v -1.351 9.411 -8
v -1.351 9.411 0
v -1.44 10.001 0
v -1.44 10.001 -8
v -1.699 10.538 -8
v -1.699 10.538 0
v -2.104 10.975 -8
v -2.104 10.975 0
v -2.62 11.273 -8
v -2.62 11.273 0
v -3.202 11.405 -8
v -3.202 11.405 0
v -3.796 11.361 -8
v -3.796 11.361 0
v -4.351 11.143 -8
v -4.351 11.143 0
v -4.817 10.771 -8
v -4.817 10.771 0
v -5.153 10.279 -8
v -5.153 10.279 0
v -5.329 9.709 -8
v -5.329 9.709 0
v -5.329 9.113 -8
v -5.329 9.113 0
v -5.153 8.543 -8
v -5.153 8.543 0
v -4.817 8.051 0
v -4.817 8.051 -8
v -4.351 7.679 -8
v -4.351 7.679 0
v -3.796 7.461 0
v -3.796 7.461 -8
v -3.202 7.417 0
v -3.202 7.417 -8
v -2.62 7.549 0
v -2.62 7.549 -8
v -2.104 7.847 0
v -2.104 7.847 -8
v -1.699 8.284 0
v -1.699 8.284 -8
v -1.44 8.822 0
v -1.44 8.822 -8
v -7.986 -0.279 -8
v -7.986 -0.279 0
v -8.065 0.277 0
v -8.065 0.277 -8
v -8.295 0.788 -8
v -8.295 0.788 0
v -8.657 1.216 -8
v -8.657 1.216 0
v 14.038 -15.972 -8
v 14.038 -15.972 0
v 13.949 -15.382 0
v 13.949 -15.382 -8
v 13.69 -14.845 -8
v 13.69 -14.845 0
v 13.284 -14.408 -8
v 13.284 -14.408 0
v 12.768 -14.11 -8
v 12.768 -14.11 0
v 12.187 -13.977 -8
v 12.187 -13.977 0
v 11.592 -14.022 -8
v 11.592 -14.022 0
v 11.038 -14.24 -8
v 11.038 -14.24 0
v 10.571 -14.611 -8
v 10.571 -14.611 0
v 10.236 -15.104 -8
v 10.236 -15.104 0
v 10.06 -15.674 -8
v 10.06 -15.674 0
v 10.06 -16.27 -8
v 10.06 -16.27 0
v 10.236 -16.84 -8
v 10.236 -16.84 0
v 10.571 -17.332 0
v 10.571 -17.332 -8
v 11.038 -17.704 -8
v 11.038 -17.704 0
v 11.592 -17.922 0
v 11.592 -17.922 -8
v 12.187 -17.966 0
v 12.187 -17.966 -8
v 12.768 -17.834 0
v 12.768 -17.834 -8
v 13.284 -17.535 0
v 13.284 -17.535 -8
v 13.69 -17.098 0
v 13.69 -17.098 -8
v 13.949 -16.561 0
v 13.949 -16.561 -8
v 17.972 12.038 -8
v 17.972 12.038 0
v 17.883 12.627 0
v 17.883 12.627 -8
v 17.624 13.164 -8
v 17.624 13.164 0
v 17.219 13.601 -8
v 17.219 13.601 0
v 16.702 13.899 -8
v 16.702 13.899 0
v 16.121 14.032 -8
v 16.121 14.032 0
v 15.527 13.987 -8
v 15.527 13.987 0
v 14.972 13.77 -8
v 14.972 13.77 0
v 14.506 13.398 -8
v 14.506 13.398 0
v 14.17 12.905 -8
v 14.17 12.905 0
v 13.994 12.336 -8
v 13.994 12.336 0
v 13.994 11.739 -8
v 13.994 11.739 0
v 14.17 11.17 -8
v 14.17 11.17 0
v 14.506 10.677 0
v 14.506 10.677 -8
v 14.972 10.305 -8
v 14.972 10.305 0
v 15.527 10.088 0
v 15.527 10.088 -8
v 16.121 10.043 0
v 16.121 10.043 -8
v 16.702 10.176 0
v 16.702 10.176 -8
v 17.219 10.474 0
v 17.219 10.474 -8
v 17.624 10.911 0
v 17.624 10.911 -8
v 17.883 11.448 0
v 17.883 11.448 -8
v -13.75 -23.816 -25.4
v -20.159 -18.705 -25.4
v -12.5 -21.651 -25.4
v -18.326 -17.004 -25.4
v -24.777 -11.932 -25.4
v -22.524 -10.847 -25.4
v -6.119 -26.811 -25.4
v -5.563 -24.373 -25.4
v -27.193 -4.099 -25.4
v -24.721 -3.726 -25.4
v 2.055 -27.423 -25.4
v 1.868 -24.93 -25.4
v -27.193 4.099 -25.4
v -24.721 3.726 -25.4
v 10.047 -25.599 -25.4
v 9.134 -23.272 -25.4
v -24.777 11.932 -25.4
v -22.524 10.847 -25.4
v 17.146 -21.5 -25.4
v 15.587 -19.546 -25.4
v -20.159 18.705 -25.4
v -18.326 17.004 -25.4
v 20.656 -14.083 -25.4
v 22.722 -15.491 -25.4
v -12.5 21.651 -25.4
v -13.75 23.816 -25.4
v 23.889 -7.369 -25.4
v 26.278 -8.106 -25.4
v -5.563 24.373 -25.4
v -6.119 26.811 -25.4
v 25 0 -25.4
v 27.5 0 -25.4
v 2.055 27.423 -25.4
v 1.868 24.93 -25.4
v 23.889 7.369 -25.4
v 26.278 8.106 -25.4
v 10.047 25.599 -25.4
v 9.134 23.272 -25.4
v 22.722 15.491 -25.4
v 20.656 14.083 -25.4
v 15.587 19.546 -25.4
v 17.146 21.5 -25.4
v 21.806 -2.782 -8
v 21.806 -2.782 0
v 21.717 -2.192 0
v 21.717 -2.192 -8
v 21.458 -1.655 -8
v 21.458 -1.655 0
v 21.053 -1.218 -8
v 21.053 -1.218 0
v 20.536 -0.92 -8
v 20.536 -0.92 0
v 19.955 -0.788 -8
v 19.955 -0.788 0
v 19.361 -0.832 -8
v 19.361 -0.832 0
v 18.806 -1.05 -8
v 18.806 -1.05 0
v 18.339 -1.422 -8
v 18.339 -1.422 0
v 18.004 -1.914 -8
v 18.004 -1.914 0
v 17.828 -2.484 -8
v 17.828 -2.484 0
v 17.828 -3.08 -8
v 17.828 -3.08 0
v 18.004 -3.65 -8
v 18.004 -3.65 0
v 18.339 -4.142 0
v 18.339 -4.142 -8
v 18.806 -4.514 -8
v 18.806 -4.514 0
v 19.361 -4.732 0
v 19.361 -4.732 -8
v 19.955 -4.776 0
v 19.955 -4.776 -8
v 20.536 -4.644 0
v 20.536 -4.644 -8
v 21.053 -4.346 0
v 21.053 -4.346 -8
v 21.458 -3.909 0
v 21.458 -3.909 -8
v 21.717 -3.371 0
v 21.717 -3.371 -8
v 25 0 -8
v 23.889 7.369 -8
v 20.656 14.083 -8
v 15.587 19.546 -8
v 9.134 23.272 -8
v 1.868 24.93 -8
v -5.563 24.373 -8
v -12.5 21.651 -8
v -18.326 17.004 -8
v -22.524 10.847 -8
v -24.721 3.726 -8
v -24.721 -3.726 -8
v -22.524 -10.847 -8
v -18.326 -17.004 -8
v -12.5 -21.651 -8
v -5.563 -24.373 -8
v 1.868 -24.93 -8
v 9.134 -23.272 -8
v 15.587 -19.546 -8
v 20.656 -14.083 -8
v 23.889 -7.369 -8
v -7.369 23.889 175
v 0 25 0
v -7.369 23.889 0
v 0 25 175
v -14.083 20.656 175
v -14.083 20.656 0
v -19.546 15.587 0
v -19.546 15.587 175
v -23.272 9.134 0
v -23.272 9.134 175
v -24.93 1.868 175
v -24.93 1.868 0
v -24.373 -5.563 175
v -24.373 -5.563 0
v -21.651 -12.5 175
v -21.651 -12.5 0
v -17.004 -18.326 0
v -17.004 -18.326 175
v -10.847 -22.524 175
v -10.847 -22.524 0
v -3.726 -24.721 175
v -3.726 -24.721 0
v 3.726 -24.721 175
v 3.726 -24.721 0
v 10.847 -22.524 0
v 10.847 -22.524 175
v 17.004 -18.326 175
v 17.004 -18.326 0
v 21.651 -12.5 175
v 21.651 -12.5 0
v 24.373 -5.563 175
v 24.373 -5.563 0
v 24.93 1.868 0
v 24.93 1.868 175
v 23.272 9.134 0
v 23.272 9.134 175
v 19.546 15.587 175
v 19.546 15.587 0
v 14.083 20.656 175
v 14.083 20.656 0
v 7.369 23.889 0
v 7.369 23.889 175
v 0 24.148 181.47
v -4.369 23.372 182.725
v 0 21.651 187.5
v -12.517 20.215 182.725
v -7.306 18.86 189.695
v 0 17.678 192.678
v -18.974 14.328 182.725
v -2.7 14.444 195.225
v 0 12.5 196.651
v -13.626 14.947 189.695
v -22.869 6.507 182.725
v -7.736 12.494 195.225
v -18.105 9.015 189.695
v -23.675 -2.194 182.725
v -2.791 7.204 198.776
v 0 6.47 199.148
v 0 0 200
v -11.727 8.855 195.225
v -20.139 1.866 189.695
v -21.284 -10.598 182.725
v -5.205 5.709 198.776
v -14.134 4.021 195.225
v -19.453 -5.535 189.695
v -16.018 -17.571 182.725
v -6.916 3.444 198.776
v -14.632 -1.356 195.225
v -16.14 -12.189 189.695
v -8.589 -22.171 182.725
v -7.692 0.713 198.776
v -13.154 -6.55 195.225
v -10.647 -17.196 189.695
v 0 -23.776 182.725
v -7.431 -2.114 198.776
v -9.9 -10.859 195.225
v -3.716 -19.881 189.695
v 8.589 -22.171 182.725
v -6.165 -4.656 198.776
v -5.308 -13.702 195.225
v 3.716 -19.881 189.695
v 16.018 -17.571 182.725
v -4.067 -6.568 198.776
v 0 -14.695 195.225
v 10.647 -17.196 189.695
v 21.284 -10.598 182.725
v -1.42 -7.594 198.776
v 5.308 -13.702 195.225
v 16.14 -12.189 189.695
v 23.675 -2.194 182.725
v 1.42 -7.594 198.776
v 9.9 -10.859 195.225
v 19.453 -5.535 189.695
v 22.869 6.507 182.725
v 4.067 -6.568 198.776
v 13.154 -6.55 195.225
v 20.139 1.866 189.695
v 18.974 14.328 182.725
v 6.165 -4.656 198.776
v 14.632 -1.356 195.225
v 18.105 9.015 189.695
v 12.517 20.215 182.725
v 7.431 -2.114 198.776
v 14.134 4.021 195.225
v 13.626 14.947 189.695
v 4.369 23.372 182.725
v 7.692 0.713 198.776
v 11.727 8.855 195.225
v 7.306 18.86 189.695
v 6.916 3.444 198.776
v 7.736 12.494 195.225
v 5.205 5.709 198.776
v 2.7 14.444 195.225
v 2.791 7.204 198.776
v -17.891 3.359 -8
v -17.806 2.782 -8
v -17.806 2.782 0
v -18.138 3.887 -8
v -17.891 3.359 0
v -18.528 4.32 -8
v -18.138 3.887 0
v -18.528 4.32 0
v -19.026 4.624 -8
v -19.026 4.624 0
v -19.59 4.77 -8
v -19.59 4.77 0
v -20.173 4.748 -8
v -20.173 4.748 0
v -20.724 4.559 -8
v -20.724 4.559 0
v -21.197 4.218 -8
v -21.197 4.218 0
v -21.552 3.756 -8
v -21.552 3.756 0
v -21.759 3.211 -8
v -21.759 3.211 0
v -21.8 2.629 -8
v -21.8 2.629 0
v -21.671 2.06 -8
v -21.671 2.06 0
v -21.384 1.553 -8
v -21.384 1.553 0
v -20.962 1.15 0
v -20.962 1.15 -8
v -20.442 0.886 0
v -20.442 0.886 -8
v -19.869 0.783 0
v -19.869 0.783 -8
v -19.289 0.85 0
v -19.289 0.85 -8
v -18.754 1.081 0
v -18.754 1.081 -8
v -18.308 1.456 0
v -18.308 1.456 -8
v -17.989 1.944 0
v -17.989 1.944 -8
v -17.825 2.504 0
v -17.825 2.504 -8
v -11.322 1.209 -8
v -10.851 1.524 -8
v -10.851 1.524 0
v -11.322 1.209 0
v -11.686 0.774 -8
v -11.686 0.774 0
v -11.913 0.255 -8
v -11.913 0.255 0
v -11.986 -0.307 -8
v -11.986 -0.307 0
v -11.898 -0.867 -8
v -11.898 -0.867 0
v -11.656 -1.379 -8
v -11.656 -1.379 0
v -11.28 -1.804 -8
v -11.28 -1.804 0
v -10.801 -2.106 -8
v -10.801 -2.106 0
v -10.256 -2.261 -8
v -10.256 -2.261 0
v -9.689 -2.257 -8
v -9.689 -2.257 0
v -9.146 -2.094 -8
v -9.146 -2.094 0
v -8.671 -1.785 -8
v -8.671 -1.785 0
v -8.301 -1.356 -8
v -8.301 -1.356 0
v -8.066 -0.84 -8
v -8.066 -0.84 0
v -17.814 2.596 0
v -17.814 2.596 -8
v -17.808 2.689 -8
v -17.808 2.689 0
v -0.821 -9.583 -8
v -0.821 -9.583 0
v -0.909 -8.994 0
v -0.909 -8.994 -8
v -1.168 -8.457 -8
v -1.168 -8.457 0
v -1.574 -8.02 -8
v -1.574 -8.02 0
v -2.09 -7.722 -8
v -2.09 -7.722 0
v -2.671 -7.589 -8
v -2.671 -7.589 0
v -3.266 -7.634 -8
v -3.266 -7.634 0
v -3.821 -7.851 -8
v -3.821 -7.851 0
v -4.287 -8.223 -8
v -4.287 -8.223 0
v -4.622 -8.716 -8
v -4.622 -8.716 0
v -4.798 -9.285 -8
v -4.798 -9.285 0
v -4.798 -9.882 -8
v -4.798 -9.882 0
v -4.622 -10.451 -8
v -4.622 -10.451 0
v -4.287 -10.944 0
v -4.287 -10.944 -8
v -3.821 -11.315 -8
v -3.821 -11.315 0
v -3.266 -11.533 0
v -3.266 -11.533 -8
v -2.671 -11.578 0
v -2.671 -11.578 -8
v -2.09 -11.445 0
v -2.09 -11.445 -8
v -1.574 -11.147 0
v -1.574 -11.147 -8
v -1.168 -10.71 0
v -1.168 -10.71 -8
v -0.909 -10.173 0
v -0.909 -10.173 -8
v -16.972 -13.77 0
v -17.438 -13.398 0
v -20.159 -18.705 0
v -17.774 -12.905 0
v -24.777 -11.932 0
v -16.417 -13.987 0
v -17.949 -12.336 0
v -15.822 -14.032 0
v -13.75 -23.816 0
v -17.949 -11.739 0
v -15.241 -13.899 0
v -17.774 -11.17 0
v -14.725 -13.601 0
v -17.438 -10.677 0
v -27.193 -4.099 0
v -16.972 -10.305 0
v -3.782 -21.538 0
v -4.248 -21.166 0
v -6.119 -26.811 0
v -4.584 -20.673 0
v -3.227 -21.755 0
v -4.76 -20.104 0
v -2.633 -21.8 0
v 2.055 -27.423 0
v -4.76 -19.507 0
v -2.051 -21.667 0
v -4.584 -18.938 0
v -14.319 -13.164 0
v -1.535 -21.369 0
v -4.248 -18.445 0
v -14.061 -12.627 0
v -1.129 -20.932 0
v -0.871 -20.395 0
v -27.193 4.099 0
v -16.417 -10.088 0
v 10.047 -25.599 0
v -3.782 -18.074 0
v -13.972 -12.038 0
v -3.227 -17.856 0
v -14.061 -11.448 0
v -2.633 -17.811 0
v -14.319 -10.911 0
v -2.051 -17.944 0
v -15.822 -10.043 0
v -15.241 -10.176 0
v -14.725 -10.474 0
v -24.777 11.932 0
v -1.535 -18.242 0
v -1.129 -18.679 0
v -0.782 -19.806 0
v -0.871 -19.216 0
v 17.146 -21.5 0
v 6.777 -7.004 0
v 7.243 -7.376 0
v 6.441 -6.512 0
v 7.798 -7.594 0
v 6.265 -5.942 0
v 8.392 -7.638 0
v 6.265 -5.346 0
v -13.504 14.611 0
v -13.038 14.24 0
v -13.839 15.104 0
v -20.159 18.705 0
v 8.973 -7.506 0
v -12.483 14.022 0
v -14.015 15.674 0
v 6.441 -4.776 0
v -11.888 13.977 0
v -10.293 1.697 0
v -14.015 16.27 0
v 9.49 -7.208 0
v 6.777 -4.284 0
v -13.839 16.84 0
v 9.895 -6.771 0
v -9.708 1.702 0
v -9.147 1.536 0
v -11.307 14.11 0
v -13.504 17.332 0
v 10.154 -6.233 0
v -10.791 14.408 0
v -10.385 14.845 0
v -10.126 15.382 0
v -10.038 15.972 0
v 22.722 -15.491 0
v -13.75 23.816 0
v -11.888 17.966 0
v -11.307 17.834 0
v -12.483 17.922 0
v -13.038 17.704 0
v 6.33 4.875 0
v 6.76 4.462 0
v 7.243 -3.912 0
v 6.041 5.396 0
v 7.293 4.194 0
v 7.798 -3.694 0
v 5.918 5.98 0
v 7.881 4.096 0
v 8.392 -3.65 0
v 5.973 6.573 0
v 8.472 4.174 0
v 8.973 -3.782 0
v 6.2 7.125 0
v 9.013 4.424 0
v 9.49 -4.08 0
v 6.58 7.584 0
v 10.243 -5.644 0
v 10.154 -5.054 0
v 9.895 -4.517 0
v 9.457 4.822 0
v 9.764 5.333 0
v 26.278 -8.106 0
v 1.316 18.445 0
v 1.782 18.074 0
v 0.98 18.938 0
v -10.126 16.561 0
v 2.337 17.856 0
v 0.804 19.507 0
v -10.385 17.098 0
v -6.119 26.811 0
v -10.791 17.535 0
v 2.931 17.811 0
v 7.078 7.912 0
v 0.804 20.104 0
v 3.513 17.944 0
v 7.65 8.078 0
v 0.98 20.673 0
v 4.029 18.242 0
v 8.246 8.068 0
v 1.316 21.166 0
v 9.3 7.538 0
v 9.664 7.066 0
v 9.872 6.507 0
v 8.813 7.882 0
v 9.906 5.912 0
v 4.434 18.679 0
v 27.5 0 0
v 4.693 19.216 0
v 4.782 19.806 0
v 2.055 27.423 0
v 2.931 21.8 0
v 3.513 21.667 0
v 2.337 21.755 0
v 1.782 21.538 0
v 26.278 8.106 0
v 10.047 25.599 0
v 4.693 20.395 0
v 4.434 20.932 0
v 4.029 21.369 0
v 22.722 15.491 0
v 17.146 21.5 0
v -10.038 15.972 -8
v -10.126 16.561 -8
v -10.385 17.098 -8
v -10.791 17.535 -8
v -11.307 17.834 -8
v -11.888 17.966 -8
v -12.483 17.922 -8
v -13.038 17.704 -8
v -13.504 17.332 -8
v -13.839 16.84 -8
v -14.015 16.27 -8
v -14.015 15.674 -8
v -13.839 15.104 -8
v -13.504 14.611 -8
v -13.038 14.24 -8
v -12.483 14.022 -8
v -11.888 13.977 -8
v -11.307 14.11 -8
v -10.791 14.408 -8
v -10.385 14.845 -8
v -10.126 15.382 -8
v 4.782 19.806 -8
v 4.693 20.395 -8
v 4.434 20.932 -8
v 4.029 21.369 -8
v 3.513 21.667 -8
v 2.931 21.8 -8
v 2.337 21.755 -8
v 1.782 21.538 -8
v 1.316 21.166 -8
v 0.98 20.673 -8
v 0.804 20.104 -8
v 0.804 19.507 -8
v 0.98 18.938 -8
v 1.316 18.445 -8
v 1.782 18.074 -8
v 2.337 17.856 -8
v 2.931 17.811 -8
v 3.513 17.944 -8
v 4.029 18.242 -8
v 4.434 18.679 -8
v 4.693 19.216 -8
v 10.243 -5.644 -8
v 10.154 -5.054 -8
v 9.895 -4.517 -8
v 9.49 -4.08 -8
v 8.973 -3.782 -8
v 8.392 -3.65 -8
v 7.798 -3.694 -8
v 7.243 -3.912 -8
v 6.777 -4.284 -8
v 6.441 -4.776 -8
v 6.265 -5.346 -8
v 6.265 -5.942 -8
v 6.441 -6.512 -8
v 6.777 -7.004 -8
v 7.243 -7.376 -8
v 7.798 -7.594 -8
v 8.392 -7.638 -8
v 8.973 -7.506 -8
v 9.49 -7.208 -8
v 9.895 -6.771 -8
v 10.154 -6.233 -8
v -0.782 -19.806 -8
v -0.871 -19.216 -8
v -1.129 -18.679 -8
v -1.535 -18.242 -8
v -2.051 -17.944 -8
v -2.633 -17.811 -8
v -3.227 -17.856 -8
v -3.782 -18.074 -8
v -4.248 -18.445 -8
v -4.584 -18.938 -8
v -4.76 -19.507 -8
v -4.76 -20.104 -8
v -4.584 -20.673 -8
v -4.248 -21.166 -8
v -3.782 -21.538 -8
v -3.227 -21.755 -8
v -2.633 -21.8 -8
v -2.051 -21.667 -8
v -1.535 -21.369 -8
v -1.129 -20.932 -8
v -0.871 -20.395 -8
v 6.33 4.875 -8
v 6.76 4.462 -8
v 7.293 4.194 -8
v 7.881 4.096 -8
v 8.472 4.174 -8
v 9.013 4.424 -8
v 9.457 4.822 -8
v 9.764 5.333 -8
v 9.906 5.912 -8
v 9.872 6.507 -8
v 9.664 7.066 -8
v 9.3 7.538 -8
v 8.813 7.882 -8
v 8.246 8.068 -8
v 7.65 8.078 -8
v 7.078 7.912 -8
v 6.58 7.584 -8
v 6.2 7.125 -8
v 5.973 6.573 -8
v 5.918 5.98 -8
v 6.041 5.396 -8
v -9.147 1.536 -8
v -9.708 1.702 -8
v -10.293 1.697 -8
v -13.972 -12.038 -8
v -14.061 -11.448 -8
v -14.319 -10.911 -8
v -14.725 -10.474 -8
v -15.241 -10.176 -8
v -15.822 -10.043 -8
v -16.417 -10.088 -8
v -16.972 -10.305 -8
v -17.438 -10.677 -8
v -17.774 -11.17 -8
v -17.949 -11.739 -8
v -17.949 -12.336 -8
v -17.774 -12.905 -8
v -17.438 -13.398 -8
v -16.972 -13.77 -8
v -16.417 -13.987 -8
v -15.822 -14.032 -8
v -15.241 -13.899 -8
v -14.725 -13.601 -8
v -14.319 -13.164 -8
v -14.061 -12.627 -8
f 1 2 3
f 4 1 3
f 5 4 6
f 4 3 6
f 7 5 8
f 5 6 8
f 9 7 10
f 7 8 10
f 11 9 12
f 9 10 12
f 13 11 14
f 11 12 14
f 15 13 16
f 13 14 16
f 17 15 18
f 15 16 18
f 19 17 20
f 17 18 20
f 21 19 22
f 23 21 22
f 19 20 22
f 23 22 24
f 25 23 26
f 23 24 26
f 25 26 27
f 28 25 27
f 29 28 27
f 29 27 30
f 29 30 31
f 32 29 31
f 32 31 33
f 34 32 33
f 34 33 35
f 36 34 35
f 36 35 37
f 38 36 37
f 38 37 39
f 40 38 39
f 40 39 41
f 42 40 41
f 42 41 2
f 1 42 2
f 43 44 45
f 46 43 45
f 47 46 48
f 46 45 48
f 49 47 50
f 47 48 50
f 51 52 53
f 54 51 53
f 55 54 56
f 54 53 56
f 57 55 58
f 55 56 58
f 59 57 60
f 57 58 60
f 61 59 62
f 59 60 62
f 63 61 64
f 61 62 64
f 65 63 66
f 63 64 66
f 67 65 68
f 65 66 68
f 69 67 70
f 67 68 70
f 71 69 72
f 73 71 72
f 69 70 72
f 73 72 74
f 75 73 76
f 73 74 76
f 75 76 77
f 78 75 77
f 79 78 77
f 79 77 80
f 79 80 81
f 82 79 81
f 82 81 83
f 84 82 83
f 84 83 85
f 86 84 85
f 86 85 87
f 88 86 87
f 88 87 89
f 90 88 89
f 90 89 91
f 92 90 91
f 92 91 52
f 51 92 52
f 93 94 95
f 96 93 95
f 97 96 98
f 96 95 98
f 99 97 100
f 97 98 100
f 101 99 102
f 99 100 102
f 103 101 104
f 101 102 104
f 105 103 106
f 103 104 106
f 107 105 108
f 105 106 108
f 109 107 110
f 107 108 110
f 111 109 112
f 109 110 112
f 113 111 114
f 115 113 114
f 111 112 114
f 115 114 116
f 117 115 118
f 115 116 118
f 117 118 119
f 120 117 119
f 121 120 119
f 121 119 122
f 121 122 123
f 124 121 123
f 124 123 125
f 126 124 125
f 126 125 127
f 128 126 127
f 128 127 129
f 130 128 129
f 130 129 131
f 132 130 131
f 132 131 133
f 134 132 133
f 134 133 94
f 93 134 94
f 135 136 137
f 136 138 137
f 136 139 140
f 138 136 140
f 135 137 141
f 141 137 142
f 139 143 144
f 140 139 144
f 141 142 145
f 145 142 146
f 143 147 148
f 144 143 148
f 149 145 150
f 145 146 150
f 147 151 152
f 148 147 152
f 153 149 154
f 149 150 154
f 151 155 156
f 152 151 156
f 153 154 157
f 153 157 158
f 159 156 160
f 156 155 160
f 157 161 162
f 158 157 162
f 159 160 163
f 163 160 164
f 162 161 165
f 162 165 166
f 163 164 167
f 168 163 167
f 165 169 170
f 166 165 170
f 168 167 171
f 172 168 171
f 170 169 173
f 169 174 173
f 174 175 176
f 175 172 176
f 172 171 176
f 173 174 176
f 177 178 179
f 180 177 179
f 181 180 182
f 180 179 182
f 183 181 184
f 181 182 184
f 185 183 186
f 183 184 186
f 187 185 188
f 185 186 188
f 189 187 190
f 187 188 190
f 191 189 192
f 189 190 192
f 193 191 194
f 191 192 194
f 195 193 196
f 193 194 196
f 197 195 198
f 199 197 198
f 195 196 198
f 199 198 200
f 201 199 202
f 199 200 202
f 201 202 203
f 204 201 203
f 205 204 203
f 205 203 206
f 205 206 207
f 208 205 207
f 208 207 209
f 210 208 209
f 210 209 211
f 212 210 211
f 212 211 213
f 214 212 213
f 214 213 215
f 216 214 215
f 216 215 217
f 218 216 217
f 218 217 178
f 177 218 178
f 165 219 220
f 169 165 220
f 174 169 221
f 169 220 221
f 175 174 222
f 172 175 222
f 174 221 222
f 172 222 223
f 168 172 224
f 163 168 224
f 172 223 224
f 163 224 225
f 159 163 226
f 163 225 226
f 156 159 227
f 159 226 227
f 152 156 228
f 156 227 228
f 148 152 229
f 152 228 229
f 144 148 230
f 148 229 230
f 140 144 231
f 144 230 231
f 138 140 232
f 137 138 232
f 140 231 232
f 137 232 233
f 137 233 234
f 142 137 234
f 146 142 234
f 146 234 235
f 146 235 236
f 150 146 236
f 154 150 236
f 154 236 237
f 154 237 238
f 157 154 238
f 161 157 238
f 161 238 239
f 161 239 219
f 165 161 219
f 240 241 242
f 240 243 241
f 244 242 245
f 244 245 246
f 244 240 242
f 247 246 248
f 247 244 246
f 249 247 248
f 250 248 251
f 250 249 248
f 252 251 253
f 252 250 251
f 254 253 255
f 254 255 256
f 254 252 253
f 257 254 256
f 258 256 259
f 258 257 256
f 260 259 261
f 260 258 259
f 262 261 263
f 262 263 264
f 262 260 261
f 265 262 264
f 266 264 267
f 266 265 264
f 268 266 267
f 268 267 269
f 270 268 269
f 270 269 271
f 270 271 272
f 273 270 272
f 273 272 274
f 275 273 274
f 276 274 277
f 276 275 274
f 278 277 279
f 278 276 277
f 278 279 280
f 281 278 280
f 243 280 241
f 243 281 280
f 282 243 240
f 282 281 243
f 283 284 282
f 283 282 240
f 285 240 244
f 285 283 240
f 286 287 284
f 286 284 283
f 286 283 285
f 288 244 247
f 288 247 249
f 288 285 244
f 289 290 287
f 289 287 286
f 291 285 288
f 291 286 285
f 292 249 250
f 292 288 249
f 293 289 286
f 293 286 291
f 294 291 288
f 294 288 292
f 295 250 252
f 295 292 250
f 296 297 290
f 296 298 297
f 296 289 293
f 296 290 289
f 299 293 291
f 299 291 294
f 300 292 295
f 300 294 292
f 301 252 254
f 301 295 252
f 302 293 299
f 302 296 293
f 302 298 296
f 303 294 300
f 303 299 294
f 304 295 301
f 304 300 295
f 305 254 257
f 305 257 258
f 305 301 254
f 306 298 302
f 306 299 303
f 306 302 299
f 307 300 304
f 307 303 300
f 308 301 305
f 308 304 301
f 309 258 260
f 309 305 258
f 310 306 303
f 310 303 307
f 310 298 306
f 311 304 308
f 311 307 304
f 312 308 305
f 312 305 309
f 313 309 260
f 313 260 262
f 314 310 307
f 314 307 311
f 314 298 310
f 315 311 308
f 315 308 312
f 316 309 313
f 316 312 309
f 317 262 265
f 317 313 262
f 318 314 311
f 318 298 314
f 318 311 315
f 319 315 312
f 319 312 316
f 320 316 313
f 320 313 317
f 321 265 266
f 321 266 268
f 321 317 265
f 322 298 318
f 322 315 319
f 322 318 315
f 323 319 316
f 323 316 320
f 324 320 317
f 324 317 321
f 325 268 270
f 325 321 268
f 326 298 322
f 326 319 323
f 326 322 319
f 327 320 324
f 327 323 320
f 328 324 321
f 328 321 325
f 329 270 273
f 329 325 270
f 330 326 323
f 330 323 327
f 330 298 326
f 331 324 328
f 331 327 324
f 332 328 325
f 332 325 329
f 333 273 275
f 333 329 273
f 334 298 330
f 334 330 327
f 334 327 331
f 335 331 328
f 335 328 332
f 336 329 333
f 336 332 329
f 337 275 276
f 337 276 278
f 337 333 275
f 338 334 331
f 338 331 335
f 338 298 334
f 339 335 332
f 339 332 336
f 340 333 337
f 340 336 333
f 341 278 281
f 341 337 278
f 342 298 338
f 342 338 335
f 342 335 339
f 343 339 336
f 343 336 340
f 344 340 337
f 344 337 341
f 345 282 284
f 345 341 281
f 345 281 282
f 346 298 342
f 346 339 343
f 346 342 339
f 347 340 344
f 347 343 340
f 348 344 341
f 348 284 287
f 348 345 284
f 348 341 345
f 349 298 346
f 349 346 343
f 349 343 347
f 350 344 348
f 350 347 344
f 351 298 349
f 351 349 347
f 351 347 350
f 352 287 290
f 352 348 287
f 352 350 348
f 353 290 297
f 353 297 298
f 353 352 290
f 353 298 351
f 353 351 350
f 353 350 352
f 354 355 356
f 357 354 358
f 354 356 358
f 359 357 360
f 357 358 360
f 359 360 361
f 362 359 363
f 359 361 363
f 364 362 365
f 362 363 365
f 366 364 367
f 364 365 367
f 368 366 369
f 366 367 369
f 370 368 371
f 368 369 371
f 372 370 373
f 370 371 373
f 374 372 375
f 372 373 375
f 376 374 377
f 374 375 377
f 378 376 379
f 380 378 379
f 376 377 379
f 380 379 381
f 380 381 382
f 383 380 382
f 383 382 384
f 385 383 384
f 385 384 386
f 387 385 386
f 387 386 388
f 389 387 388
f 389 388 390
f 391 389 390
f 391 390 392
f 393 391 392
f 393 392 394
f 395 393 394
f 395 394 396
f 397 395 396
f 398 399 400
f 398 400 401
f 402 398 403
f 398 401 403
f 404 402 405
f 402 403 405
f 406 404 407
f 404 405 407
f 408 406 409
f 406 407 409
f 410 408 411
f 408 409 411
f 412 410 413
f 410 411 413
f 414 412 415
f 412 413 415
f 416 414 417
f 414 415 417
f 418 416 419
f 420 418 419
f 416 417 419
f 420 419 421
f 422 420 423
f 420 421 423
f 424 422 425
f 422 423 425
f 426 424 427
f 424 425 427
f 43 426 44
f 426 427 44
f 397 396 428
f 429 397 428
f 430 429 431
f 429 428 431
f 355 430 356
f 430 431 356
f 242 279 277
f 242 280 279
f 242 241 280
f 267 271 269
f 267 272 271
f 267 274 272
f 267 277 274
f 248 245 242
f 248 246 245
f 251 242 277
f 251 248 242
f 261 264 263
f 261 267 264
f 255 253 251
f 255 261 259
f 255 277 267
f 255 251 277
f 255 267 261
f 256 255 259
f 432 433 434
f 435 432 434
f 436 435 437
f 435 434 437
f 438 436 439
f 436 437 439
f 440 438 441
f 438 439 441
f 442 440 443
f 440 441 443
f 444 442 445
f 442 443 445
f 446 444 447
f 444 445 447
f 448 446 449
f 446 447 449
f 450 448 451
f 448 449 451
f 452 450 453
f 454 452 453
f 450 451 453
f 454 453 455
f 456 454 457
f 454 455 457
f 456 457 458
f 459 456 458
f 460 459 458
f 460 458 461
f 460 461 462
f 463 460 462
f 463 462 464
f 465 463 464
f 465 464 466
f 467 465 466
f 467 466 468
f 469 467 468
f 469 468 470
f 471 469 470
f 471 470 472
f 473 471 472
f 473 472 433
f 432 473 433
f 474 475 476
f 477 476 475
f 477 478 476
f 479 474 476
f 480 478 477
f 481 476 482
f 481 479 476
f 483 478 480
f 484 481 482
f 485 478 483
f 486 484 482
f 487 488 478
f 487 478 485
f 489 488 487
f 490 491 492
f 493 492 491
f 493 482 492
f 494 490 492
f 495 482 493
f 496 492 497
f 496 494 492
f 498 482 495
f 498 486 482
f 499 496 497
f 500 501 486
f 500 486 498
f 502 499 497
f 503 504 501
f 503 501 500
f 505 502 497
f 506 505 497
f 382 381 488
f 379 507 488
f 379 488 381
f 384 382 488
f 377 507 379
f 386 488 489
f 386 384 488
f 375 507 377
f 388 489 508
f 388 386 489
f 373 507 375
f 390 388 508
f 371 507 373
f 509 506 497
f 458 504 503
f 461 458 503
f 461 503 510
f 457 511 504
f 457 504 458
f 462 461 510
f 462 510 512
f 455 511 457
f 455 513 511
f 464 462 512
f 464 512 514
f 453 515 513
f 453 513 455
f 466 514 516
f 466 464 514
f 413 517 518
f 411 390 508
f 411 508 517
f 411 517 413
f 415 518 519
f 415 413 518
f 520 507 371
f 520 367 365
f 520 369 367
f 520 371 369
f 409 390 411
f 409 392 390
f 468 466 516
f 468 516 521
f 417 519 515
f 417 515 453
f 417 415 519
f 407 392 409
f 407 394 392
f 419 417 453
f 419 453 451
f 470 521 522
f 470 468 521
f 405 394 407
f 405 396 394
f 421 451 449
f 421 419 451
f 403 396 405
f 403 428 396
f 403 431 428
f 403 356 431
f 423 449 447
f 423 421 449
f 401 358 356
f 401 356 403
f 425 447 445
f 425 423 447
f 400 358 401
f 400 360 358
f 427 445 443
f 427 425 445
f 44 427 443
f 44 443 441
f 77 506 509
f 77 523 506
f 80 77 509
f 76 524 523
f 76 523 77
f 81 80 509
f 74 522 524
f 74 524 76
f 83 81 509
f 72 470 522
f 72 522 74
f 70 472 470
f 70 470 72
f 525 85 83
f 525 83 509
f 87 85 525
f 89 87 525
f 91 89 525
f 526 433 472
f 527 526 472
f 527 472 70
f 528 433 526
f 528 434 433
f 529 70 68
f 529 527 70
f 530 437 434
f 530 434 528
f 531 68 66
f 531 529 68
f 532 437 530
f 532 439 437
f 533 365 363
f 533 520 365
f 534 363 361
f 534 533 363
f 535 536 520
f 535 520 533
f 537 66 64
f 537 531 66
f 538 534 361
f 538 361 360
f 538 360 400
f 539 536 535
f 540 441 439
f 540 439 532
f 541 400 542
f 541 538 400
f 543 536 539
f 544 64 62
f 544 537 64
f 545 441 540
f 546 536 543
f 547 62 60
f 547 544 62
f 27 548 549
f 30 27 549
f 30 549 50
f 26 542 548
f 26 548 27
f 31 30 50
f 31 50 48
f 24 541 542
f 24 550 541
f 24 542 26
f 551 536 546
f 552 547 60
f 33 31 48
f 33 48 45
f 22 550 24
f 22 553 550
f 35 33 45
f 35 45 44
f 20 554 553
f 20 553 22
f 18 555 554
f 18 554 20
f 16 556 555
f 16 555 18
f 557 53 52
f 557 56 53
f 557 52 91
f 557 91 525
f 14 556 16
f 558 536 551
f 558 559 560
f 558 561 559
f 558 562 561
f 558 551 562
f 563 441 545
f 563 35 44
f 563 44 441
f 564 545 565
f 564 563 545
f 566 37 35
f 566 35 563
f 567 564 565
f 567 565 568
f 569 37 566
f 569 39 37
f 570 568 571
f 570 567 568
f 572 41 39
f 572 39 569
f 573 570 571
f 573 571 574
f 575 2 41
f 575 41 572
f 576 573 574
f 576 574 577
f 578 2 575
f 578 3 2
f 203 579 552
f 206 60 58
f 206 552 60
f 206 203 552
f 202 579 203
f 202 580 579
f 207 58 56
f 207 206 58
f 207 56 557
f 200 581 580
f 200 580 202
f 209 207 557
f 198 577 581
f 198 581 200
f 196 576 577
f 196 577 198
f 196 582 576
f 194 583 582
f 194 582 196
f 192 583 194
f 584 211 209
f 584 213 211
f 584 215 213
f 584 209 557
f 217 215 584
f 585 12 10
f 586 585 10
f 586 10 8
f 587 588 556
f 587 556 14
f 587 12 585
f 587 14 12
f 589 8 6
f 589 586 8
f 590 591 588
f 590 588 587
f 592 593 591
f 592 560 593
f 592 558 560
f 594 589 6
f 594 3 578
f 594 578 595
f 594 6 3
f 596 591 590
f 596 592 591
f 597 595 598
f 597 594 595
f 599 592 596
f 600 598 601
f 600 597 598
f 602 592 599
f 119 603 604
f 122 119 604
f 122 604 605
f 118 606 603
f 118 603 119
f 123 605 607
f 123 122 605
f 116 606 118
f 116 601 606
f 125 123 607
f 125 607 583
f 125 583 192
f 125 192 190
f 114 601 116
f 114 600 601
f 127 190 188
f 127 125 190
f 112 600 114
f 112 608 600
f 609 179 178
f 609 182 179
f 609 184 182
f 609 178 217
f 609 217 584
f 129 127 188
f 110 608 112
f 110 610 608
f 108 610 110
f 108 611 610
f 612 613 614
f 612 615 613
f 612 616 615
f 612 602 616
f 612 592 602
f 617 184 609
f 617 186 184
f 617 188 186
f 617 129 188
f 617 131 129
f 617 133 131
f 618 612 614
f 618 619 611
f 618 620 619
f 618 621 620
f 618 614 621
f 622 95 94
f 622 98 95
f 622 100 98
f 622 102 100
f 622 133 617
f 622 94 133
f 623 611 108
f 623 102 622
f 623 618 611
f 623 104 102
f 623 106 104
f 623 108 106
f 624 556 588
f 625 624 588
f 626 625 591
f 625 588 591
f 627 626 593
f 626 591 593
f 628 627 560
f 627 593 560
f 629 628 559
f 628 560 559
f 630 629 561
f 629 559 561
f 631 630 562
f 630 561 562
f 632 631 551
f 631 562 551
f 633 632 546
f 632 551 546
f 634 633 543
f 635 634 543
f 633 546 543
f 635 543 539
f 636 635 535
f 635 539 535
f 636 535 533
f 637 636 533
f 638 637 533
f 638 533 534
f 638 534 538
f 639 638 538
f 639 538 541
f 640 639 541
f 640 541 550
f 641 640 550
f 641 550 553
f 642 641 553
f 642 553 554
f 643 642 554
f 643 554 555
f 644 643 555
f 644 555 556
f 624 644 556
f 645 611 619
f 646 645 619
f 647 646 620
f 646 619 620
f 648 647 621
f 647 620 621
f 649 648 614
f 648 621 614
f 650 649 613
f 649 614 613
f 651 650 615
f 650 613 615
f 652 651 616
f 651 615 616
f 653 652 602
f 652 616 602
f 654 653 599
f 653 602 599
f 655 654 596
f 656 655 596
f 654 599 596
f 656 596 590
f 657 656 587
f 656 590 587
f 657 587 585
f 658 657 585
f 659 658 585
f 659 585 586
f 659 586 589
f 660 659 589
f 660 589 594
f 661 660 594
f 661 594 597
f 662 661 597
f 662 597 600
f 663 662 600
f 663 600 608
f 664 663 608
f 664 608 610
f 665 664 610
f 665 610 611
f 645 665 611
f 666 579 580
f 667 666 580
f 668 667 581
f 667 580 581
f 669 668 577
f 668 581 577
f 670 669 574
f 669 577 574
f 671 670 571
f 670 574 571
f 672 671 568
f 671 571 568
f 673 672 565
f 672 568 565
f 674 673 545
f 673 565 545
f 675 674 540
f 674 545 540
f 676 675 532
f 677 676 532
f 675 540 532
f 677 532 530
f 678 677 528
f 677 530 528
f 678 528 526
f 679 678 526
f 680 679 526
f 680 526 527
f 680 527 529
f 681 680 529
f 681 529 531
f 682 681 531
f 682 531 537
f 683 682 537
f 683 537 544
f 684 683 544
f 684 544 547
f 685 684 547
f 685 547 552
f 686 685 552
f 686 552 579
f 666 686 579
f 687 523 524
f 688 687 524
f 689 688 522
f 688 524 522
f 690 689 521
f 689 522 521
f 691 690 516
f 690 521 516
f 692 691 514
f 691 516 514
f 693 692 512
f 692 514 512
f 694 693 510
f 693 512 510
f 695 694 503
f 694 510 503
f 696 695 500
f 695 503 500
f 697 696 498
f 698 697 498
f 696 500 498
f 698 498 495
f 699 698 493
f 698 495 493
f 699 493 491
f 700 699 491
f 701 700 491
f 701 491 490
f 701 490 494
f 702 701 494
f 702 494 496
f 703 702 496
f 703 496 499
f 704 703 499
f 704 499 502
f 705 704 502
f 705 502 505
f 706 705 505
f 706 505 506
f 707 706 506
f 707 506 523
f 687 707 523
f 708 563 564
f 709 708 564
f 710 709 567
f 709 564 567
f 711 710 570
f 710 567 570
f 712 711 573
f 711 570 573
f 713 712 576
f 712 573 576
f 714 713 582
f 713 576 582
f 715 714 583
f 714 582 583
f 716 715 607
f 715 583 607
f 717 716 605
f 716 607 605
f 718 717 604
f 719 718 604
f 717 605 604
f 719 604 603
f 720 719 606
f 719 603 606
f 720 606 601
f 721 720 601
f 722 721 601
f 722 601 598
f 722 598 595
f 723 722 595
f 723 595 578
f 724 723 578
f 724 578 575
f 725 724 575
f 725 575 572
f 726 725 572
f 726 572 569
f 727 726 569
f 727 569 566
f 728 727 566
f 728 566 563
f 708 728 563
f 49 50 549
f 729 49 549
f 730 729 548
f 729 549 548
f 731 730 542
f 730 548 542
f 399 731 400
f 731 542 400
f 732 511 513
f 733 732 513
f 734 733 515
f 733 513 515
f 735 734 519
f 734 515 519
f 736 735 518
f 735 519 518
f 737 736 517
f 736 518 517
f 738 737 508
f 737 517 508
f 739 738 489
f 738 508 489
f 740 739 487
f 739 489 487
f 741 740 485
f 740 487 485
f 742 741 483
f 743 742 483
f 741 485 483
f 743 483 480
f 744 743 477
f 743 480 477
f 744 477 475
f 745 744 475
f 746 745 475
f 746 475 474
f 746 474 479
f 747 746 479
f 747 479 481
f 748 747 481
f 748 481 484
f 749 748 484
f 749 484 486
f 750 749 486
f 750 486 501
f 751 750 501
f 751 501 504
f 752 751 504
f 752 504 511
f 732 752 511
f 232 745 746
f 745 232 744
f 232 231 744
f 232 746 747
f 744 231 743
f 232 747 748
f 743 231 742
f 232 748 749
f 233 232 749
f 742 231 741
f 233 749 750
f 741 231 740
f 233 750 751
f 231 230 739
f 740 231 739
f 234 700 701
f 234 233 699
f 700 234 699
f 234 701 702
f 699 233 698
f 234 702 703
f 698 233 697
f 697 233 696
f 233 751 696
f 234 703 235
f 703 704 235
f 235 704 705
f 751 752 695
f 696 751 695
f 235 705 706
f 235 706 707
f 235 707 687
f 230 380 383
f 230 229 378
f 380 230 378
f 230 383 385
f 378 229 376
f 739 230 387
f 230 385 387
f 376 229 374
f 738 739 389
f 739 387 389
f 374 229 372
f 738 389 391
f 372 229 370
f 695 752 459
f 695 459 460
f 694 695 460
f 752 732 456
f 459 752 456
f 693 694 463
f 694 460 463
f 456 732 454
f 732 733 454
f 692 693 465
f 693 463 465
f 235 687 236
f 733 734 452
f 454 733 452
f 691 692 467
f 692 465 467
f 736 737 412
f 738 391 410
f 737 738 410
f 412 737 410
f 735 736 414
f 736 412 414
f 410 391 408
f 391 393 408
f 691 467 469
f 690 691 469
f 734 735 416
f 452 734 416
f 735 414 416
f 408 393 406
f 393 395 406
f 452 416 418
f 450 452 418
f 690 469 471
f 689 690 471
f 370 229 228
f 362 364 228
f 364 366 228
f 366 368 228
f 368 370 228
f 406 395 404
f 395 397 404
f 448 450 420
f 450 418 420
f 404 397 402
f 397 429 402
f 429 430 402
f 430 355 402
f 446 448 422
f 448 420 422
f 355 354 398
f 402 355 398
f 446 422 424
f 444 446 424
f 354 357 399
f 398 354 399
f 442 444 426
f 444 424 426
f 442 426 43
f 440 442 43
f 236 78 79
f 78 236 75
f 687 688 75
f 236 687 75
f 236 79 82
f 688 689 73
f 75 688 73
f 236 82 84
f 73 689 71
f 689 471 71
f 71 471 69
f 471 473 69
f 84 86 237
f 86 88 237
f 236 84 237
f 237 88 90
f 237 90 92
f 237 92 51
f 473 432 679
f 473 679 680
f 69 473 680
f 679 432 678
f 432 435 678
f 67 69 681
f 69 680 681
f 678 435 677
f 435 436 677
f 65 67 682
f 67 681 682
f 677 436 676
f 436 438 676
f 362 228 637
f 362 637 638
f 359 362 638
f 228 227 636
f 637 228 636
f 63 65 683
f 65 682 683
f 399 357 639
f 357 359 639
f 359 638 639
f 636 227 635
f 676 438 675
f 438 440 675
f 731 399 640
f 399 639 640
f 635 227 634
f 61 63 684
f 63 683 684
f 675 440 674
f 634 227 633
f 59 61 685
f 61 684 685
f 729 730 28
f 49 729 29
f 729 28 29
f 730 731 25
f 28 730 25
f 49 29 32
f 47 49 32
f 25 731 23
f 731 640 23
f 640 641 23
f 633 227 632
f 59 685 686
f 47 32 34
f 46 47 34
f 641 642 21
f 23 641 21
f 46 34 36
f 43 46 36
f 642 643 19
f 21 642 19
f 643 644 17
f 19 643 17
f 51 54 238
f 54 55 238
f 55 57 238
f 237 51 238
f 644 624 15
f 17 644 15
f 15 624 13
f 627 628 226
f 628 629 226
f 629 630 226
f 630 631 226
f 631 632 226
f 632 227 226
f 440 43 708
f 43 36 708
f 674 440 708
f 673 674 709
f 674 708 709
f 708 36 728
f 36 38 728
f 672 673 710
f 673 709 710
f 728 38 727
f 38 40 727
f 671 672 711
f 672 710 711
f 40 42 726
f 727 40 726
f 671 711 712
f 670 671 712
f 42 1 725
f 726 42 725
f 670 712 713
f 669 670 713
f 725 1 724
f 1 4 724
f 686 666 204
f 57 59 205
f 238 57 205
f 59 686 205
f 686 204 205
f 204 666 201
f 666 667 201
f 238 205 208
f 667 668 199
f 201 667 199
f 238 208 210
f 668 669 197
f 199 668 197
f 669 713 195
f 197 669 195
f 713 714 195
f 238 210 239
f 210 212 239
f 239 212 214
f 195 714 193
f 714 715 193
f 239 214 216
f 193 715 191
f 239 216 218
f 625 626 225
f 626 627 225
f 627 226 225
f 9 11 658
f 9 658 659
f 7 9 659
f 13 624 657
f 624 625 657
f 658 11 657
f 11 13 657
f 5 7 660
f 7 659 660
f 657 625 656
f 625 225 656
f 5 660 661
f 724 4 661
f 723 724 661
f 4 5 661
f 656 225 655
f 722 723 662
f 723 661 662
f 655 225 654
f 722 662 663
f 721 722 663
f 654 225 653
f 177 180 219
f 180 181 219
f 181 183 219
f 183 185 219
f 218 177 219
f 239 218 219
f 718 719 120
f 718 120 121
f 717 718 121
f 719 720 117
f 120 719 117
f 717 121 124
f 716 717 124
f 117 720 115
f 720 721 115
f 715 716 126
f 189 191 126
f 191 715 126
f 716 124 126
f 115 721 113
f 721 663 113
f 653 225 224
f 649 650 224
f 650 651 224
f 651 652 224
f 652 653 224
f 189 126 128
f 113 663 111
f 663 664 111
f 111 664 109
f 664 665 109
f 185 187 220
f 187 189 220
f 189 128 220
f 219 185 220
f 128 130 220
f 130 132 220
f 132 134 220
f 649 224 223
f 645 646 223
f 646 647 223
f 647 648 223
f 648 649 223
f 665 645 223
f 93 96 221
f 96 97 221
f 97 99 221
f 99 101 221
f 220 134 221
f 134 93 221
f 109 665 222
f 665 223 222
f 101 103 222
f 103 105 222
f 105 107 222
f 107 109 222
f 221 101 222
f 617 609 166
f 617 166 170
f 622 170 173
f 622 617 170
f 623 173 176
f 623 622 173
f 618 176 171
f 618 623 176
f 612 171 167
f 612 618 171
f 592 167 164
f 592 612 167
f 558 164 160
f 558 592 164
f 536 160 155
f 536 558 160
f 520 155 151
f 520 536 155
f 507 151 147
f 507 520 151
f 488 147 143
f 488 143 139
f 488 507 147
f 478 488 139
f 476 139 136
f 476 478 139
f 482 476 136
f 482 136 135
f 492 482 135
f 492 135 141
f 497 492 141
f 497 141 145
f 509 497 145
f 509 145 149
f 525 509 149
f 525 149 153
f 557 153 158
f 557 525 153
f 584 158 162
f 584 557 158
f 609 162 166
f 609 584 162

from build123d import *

# Parameters (mm, degrees)
F2_R     = 27.5
F2_R_2   = 25
F3_DEPTH = 25.4
F4_DEPTH = 8
F5_R     = 2
F6_DEPTH = 25


with BuildPart() as f1:
    # F0 (on Right) → F1 (revolve)
    with BuildSketch(Plane.YZ):
        with BuildLine():
            Line((0, 200), (0, 0))
            Line((0, 0), (25, 0))
            Line((25, 0), (25, 175))
            ThreePointArc((25, 175), (17.6776695297, 192.6776695297), (0, 200))
        make_face()
    revolve(axis=Axis((0, 0, 100), (0, 0, 1)))


with BuildPart() as f3:
    # F2 (on Top) → F3 (new body)
    with BuildSketch(Plane.XY):
        Circle(F2_R)
        Circle(F2_R_2, mode=Mode.SUBTRACT)
    extrude(amount=-F3_DEPTH)

    # F2 (on Top) → F4 (join)
    with BuildSketch(Plane.XY):
        Circle(F2_R_2)
    extrude(amount=-F4_DEPTH)

    # F5 (on face) → F6 (cut)
    with BuildSketch(Plane.XY):
        with BuildLine():
            ThreePointArc((9.9148839653, 6.0952902816), (7.2703518936, 7.98858857), (6.3303055567, 4.8749988135))
            ThreePointArc((6.3303055567, 4.8749988135), (8.559416037, 4.2019919933), (9.9148839653, 6.0952902816))
        make_face()
        with BuildLine():
            ThreePointArc((-17.8055719167, 2.7819635249), (-21.8007052936, 2.921400996), (-17.825014725, 2.5037671724))
            ThreePointArc((-17.825014725, 2.5037671724), (-17.8104385397, 2.6425260539), (-17.8055719167, 2.7819635249))
        make_face()
        with BuildLine():
            ThreePointArc((-7.9859973724, -0.2789413551), (-8.1615739108, 0.5404968871), (-8.6574764052, 1.2160609993))
            Line((-8.6574764052, 1.2160609993), (-10.851248059, 1.5242062399))
            ThreePointArc((-10.851248059, 1.5242062399), (-11.0512435005, -1.9716464938), (-7.9859973724, -0.2789413551))
        make_face()
        with BuildLine():
            Line((-10.851248059, 1.5242062399), (-8.6574764052, 1.2160609993))
            ThreePointArc((-8.6574764052, 1.2160609993), (-9.7078010199, 1.7016158366), (-10.851248059, 1.5242062399))
        make_face()
        with Locations((-15.971799481, -12.0375089341)):
            Circle(F5_R)
        with Locations((-2.7819635249, -19.8055719167)):
            Circle(F5_R)
        with Locations((12.0375089341, -15.971799481)):
            Circle(F5_R)
        with Locations((19.8055719167, -2.7819635249)):
            Circle(F5_R)
        with Locations((15.971799481, 12.0375089341)):
            Circle(F5_R)
        with Locations((2.7819635249, 19.8055719167)):
            Circle(F5_R)
        with Locations((-12.0375089341, 15.971799481)):
            Circle(F5_R)
        with Locations((-3.3511318873, 9.4110502536)):
            Circle(F5_R)
        with Locations((-2.8205539004, -9.5834454919)):
            Circle(F5_R)
        with Locations((8.2427991948, -5.6439536882)):
            Circle(F5_R)
    extrude(amount=-F6_DEPTH, mode=Mode.SUBTRACT)


solid = Compound([f1.part, f3.part])
